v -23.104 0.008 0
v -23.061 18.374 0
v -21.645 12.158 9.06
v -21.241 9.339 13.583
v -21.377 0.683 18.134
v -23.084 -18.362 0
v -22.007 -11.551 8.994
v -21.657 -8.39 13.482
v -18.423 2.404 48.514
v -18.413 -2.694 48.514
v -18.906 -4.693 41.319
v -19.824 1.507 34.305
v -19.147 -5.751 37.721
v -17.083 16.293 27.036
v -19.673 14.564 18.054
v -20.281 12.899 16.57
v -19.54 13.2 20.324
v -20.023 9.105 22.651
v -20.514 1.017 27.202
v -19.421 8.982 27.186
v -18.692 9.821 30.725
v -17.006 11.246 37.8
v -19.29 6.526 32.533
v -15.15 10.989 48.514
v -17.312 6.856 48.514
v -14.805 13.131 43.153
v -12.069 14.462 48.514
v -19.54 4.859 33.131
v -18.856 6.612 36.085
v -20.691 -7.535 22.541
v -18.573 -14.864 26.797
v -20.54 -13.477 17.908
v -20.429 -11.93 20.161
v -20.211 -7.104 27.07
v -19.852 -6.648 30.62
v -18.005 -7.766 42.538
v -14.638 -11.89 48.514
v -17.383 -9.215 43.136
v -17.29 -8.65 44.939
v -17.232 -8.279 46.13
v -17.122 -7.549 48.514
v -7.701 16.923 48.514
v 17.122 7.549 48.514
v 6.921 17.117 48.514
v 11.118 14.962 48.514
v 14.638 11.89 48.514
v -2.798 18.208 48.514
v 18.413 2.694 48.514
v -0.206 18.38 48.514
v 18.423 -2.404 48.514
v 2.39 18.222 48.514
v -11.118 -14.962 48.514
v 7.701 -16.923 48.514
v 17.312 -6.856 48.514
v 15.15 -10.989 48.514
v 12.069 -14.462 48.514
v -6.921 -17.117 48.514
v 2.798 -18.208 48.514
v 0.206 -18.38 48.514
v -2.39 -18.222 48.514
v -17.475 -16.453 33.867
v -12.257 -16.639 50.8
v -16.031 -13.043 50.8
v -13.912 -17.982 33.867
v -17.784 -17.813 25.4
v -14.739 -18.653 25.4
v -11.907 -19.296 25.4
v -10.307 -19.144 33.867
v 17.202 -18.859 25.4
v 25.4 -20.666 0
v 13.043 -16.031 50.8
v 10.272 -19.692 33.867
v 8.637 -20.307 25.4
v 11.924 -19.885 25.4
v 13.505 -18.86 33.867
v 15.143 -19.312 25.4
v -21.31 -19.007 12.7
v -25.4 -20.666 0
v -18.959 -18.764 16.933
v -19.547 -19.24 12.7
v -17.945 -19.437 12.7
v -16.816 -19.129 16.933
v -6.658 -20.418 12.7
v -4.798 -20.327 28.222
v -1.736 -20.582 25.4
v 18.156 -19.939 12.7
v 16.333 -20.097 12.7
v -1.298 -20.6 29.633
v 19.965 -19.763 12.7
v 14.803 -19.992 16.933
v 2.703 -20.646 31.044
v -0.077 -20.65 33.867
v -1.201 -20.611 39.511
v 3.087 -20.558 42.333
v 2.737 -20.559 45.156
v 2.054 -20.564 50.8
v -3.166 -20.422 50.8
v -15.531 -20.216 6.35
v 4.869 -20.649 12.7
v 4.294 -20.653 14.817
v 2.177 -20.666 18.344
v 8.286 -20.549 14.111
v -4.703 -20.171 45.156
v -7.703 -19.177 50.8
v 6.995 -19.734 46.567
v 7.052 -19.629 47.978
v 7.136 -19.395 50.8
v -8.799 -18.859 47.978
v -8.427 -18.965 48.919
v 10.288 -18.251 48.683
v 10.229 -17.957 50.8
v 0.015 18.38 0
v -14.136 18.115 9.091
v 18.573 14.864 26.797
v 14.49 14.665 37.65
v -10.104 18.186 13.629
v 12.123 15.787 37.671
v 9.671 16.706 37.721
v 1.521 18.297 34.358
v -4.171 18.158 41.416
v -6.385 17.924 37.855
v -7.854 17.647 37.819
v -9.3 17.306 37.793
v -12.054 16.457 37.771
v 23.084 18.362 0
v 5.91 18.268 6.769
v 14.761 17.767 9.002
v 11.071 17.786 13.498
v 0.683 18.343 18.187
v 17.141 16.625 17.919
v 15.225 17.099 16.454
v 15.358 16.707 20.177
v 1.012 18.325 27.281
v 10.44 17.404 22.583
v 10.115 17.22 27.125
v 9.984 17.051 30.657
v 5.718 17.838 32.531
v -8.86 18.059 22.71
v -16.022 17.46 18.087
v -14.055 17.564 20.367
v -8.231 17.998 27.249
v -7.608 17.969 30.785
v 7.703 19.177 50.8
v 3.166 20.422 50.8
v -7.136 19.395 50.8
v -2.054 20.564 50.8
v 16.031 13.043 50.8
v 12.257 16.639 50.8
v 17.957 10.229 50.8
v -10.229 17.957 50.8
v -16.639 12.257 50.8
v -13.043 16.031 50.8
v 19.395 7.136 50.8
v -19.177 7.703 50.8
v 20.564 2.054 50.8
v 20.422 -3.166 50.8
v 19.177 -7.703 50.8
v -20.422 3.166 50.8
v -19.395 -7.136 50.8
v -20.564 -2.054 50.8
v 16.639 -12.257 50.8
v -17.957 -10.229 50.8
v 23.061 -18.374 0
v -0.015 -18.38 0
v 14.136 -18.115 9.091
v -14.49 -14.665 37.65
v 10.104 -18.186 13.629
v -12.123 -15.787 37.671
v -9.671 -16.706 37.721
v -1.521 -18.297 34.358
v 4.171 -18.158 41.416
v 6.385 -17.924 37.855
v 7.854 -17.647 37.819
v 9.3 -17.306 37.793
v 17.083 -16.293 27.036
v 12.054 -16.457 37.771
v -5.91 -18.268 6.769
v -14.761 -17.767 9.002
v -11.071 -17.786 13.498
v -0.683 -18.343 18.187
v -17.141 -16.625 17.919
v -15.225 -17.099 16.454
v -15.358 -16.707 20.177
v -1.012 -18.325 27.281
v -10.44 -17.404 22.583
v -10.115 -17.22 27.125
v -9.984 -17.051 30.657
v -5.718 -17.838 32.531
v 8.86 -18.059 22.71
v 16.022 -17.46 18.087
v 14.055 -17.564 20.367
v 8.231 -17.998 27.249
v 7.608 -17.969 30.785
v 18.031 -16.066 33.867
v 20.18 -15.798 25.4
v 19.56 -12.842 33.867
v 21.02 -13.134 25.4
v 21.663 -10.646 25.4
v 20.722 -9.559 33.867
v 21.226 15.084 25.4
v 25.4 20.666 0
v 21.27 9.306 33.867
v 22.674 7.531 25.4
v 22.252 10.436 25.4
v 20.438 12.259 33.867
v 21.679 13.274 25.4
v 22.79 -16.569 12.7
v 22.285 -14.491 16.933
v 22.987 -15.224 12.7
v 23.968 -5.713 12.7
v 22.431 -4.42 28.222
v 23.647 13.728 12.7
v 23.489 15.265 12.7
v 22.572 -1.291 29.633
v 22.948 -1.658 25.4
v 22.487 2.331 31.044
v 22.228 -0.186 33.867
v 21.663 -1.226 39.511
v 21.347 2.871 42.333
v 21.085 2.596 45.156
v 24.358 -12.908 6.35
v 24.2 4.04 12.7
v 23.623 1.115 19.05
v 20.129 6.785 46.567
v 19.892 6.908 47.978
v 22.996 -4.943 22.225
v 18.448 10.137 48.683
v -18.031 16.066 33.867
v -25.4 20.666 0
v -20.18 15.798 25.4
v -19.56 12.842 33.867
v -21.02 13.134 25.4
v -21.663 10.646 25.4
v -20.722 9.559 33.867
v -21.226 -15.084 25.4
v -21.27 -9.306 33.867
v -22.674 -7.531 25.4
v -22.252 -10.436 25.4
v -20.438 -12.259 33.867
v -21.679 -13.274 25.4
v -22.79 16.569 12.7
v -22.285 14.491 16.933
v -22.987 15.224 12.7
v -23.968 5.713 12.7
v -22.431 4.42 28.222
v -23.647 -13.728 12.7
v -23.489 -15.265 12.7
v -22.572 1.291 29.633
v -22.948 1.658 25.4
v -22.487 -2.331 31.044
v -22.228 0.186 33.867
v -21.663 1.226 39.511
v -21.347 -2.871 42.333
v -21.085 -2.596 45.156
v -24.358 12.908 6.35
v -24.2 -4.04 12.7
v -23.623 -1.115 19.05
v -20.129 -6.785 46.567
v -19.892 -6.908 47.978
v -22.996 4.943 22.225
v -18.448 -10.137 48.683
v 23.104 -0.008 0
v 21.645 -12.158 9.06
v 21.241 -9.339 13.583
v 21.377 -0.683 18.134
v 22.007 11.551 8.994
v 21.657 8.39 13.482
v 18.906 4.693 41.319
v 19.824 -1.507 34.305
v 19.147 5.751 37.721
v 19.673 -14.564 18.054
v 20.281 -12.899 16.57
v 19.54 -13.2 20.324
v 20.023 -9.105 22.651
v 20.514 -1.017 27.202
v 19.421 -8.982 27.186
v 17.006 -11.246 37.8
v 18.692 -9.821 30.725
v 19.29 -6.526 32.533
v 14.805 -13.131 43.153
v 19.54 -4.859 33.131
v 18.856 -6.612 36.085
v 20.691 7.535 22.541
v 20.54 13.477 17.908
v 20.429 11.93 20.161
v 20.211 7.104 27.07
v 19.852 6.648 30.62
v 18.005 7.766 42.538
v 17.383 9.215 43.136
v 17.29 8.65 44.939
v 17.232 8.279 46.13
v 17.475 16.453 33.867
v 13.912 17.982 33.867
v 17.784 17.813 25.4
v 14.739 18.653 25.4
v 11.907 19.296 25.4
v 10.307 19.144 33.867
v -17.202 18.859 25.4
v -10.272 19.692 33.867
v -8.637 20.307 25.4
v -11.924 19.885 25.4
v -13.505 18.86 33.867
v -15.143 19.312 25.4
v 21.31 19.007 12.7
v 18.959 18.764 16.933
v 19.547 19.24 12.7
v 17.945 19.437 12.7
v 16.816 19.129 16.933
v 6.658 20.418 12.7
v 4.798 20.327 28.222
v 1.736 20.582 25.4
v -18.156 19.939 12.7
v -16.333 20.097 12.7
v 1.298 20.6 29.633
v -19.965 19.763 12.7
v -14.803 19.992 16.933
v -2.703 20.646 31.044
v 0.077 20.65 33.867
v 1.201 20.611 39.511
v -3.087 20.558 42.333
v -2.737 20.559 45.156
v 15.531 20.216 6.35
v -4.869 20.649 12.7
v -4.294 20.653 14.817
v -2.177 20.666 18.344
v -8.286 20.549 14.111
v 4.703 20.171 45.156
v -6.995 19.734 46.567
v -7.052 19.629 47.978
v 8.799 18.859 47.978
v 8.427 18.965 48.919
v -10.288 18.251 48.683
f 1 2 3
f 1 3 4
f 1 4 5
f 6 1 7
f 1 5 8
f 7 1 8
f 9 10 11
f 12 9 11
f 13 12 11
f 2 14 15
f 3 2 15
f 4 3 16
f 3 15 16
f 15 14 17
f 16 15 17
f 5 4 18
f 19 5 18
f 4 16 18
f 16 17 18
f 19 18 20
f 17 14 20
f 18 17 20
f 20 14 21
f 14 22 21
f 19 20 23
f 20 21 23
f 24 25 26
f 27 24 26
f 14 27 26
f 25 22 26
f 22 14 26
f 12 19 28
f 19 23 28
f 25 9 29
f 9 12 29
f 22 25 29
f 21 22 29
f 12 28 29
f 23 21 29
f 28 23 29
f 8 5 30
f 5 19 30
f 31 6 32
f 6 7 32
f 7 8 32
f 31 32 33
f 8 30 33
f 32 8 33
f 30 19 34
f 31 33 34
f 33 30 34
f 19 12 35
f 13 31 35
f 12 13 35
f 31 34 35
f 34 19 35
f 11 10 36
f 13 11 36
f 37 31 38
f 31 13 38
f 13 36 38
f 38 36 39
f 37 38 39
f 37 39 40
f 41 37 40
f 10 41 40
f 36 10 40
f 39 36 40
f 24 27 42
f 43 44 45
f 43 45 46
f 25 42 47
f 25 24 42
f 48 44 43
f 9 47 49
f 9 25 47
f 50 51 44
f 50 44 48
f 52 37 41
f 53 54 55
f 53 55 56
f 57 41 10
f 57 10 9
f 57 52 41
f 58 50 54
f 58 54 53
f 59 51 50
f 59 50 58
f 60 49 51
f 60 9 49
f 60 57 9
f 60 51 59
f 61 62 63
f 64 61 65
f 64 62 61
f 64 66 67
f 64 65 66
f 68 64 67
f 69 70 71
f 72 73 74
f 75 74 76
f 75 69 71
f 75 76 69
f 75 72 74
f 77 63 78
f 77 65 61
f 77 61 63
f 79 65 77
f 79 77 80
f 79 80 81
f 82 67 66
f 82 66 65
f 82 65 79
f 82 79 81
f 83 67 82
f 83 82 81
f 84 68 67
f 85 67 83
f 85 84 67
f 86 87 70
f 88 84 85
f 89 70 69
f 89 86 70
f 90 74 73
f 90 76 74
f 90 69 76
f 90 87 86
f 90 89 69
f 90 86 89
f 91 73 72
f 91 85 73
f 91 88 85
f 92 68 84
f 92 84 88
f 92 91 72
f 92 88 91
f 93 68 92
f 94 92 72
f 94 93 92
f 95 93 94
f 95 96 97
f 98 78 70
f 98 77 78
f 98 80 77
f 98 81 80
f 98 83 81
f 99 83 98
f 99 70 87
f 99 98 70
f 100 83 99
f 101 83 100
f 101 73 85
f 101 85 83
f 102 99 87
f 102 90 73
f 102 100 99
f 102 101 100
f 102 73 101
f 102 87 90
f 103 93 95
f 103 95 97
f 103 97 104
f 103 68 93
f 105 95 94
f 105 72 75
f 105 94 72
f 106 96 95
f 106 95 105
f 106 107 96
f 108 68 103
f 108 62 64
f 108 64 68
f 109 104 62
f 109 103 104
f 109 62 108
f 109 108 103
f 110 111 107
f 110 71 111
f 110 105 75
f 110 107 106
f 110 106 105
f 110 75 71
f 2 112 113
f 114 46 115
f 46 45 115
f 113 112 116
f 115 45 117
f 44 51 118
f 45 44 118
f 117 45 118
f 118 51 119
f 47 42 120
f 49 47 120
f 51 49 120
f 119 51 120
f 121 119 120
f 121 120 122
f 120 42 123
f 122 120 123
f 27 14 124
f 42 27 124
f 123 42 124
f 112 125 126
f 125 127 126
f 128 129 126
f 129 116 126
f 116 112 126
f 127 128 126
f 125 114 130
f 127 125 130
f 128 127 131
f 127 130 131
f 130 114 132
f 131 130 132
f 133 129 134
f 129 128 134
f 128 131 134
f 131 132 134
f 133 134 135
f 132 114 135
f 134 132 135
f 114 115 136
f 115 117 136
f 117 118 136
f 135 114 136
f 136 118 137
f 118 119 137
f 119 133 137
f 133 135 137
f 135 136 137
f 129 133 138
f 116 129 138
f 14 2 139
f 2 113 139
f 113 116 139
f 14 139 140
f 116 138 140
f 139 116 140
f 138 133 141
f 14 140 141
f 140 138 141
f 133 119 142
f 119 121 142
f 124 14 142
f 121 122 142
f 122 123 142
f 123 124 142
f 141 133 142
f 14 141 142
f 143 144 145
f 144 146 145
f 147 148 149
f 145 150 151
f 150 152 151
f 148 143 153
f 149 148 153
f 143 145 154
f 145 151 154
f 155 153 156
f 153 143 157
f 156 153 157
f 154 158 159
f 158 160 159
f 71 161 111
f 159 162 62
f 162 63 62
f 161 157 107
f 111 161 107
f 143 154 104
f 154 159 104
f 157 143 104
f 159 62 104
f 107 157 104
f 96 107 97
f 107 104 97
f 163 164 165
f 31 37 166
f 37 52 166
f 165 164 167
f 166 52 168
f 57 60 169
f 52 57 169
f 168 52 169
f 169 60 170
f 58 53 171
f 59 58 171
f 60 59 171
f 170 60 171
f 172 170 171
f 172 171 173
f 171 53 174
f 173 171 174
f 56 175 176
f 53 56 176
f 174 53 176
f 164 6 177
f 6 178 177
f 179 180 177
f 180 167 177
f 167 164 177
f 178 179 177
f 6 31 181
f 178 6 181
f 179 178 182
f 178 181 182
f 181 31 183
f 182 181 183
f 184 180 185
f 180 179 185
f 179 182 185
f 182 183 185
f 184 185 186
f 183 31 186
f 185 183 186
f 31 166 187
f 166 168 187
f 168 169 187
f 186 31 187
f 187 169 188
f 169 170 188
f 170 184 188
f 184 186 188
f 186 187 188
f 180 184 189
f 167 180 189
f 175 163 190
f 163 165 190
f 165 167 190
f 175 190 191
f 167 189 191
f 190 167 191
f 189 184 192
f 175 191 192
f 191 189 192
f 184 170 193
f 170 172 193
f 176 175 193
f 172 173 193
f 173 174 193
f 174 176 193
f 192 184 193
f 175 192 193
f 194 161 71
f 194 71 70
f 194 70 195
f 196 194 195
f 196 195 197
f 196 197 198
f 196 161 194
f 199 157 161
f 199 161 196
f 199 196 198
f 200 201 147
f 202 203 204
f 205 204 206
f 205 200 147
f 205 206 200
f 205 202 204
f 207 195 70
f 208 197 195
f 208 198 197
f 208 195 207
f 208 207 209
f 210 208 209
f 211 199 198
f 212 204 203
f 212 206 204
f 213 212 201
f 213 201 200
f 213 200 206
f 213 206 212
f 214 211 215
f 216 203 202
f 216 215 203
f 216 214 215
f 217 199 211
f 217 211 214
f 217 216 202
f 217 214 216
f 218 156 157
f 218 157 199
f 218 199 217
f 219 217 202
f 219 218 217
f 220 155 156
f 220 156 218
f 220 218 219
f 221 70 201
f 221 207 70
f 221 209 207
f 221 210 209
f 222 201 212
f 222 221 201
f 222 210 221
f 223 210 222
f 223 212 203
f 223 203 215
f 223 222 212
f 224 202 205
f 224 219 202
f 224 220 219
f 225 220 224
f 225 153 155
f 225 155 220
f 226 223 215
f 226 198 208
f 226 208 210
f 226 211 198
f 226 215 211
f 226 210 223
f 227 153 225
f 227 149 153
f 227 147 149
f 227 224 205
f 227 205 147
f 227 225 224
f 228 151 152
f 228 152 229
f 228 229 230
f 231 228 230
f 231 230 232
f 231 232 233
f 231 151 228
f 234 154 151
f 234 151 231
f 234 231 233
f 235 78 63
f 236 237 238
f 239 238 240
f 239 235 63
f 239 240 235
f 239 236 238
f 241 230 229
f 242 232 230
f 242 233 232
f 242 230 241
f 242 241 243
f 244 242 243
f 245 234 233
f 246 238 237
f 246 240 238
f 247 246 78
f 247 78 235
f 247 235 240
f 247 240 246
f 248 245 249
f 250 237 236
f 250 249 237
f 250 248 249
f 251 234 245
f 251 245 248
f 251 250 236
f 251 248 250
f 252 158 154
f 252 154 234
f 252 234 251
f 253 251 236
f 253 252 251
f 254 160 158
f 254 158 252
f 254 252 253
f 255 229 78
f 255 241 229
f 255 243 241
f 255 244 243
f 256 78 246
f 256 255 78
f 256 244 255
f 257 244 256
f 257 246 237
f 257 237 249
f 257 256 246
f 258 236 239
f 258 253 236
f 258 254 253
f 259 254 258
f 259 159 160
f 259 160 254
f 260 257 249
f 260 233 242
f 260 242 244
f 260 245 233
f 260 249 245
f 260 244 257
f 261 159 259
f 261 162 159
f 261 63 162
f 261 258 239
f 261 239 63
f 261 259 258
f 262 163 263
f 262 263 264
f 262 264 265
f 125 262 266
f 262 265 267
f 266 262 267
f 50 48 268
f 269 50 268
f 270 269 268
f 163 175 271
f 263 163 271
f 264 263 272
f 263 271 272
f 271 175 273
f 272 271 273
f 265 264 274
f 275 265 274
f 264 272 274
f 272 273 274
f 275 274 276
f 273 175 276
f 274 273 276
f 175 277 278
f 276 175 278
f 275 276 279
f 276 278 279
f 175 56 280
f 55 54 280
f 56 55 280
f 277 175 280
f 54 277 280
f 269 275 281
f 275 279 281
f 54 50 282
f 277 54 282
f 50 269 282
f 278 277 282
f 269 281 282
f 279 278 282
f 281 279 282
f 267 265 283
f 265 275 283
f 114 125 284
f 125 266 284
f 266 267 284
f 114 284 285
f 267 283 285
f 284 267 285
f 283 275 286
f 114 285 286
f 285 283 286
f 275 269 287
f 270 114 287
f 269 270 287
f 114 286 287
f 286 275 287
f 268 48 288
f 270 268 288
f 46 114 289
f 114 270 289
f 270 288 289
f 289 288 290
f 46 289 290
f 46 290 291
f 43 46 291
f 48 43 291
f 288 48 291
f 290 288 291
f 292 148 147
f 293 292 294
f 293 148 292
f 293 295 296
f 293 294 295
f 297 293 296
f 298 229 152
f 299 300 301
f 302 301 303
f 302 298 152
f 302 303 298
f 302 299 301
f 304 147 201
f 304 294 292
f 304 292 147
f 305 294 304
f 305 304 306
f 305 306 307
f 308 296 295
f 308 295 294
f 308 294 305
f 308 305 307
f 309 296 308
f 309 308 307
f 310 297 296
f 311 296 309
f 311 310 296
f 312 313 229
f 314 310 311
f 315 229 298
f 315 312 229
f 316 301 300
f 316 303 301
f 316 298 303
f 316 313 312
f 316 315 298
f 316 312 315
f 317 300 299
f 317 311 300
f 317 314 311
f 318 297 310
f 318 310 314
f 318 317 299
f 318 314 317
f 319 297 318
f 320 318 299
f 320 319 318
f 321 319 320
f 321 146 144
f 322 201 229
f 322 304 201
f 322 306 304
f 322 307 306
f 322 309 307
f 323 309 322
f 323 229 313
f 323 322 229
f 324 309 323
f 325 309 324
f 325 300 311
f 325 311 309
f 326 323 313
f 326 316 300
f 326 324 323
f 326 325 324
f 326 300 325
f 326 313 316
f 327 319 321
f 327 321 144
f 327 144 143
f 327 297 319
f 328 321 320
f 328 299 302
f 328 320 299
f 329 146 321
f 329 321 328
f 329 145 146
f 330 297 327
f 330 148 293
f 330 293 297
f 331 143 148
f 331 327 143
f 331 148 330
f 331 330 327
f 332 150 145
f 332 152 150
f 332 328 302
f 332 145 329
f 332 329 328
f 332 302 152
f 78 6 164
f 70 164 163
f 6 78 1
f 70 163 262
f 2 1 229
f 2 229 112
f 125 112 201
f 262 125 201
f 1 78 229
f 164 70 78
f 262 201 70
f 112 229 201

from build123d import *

# Parameters (mm, degrees)
F0_W = 50.8
F0_H = 41.3327284643
F4_T = 2.286


# Not quite as in the source:
# - the arcs of a loft's sections are written as splines that run evenly, so that the points pair up as in the source's solid
# - a shell that OpenCascade refuses in one call is made with other operations: the cavity is built on its own and cut out


with BuildPart() as f3:
    # F0 (on Top) → F3 section 0
    with BuildSketch(Plane.XY):
        Rectangle(F0_W, F0_H)
    # F2 (on offset) → F3 section 1
    with BuildSketch(Plane.XY.offset(50.8)):
        with BuildLine():
            add(Edge.make_bspline(
                [(16.0305352967, 13.0430268219), (15.1768711874, 14.0922229036), (14.2198939474, 15.0573165448), (12.135995559, 16.7823054792), (11.0091259391, 17.5421581187), (8.6287404272, 18.8274534668), (7.3752833949, 19.3528643939), (4.7898876398, 20.1490729763), (3.458012846, 20.4198509437), (0.7669621567, 20.696374911), (-0.5921471973, 20.7021140733), (-3.2854372521, 20.4483267645), (-4.6195513559, 20.1888065689), (-7.2115791497, 19.414460888), (-8.4694287466, 18.8996545501), (-10.8605841049, 17.6345081674), (-11.9938307403, 16.8841994059), (-13.0430268219, 16.0305352967)],
                knots=[0, 0, 0, 0, 0.125, 0.125, 0.25, 0.25, 0.375, 0.375, 0.5, 0.5, 0.625, 0.625, 0.75, 0.75, 0.875, 0.875, 1, 1, 1, 1], degree=3))
            add(Edge.make_bspline(
                [(-13.0430268219, 16.0305352967), (-14.0922229036, 15.1768711874), (-15.0573165448, 14.2198939474), (-16.7823054792, 12.135995559), (-17.5421581187, 11.0091259391), (-18.8274534668, 8.6287404272), (-19.3528643939, 7.3752833949), (-20.1490729763, 4.7898876398), (-20.4198509437, 3.458012846), (-20.696374911, 0.7669621567), (-20.7021140733, -0.5921471973), (-20.4483267645, -3.2854372521), (-20.1888065689, -4.6195513559), (-19.414460888, -7.2115791497), (-18.8996545501, -8.4694287466), (-17.6345081674, -10.8605841049), (-16.8841994059, -11.9938307403), (-16.0305352967, -13.0430268219)],
                knots=[0, 0, 0, 0, 0.125, 0.125, 0.25, 0.25, 0.375, 0.375, 0.5, 0.5, 0.625, 0.625, 0.75, 0.75, 0.875, 0.875, 1, 1, 1, 1], degree=3))
            add(Edge.make_bspline(
                [(-16.0305352967, -13.0430268219), (-15.1768711874, -14.0922229036), (-14.2198939474, -15.0573165448), (-12.135995559, -16.7823054792), (-11.0091259391, -17.5421581187), (-8.6287404272, -18.8274534668), (-7.3752833949, -19.3528643939), (-4.7898876398, -20.1490729763), (-3.458012846, -20.4198509437), (-0.7669621567, -20.696374911), (0.5921471973, -20.7021140733), (3.2854372521, -20.4483267645), (4.6195513559, -20.1888065689), (7.2115791497, -19.414460888), (8.4694287466, -18.8996545501), (10.8605841049, -17.6345081674), (11.9938307403, -16.8841994059), (13.0430268219, -16.0305352967)],
                knots=[0, 0, 0, 0, 0.125, 0.125, 0.25, 0.25, 0.375, 0.375, 0.5, 0.5, 0.625, 0.625, 0.75, 0.75, 0.875, 0.875, 1, 1, 1, 1], degree=3))
            add(Edge.make_bspline(
                [(13.0430268219, -16.0305352967), (14.0922229036, -15.1768711874), (15.0573165448, -14.2198939474), (16.7823054792, -12.135995559), (17.5421581187, -11.0091259391), (18.8274534668, -8.6287404272), (19.3528643939, -7.3752833949), (20.1490729763, -4.7898876398), (20.4198509437, -3.458012846), (20.696374911, -0.7669621567), (20.7021140733, 0.5921471973), (20.4483267645, 3.2854372521), (20.1888065689, 4.6195513559), (19.414460888, 7.2115791497), (18.8996545501, 8.4694287466), (17.6345081674, 10.8605841049), (16.8841994059, 11.9938307403), (16.0305352967, 13.0430268219)],
                knots=[0, 0, 0, 0, 0.125, 0.125, 0.25, 0.25, 0.375, 0.375, 0.5, 0.5, 0.625, 0.625, 0.75, 0.75, 0.875, 0.875, 1, 1, 1, 1], degree=3))
        make_face()
    loft(ruled=True)

    # F4: shell of thickness 2.286, made by hand


with BuildPart() as f4_core1:
    # F4_t2: copy of F3
    add(f3.part)

    # the walls: a layer under each face that stays
    f4_faces = [f4_core1.faces().sort_by_distance(p)[0] for p in [
        (22.9790564637, -1.0562437507, 25.4),
        (1.0562437507, 20.6122385797, 25.4),
        (-22.9790564637, 1.0562437507, 25.4),
        (-1.0562437507, -20.6122385797, 25.4),
        (0, 0, 50.8),
    ]]
    thicken(f4_faces, amount=-F4_T, mode=Mode.SUBTRACT)


with BuildPart() as f3_1:
    add(f3.part)

    # what is left inside the walls is the cavity
    f4_cavity = [f4_core1.part.solids().sort_by_distance(p)[0] for p in [
        (-0.625568, -18.323309, 16.343336),
    ]]
    add(f4_cavity, mode=Mode.SUBTRACT)


solid = f3_1.part
